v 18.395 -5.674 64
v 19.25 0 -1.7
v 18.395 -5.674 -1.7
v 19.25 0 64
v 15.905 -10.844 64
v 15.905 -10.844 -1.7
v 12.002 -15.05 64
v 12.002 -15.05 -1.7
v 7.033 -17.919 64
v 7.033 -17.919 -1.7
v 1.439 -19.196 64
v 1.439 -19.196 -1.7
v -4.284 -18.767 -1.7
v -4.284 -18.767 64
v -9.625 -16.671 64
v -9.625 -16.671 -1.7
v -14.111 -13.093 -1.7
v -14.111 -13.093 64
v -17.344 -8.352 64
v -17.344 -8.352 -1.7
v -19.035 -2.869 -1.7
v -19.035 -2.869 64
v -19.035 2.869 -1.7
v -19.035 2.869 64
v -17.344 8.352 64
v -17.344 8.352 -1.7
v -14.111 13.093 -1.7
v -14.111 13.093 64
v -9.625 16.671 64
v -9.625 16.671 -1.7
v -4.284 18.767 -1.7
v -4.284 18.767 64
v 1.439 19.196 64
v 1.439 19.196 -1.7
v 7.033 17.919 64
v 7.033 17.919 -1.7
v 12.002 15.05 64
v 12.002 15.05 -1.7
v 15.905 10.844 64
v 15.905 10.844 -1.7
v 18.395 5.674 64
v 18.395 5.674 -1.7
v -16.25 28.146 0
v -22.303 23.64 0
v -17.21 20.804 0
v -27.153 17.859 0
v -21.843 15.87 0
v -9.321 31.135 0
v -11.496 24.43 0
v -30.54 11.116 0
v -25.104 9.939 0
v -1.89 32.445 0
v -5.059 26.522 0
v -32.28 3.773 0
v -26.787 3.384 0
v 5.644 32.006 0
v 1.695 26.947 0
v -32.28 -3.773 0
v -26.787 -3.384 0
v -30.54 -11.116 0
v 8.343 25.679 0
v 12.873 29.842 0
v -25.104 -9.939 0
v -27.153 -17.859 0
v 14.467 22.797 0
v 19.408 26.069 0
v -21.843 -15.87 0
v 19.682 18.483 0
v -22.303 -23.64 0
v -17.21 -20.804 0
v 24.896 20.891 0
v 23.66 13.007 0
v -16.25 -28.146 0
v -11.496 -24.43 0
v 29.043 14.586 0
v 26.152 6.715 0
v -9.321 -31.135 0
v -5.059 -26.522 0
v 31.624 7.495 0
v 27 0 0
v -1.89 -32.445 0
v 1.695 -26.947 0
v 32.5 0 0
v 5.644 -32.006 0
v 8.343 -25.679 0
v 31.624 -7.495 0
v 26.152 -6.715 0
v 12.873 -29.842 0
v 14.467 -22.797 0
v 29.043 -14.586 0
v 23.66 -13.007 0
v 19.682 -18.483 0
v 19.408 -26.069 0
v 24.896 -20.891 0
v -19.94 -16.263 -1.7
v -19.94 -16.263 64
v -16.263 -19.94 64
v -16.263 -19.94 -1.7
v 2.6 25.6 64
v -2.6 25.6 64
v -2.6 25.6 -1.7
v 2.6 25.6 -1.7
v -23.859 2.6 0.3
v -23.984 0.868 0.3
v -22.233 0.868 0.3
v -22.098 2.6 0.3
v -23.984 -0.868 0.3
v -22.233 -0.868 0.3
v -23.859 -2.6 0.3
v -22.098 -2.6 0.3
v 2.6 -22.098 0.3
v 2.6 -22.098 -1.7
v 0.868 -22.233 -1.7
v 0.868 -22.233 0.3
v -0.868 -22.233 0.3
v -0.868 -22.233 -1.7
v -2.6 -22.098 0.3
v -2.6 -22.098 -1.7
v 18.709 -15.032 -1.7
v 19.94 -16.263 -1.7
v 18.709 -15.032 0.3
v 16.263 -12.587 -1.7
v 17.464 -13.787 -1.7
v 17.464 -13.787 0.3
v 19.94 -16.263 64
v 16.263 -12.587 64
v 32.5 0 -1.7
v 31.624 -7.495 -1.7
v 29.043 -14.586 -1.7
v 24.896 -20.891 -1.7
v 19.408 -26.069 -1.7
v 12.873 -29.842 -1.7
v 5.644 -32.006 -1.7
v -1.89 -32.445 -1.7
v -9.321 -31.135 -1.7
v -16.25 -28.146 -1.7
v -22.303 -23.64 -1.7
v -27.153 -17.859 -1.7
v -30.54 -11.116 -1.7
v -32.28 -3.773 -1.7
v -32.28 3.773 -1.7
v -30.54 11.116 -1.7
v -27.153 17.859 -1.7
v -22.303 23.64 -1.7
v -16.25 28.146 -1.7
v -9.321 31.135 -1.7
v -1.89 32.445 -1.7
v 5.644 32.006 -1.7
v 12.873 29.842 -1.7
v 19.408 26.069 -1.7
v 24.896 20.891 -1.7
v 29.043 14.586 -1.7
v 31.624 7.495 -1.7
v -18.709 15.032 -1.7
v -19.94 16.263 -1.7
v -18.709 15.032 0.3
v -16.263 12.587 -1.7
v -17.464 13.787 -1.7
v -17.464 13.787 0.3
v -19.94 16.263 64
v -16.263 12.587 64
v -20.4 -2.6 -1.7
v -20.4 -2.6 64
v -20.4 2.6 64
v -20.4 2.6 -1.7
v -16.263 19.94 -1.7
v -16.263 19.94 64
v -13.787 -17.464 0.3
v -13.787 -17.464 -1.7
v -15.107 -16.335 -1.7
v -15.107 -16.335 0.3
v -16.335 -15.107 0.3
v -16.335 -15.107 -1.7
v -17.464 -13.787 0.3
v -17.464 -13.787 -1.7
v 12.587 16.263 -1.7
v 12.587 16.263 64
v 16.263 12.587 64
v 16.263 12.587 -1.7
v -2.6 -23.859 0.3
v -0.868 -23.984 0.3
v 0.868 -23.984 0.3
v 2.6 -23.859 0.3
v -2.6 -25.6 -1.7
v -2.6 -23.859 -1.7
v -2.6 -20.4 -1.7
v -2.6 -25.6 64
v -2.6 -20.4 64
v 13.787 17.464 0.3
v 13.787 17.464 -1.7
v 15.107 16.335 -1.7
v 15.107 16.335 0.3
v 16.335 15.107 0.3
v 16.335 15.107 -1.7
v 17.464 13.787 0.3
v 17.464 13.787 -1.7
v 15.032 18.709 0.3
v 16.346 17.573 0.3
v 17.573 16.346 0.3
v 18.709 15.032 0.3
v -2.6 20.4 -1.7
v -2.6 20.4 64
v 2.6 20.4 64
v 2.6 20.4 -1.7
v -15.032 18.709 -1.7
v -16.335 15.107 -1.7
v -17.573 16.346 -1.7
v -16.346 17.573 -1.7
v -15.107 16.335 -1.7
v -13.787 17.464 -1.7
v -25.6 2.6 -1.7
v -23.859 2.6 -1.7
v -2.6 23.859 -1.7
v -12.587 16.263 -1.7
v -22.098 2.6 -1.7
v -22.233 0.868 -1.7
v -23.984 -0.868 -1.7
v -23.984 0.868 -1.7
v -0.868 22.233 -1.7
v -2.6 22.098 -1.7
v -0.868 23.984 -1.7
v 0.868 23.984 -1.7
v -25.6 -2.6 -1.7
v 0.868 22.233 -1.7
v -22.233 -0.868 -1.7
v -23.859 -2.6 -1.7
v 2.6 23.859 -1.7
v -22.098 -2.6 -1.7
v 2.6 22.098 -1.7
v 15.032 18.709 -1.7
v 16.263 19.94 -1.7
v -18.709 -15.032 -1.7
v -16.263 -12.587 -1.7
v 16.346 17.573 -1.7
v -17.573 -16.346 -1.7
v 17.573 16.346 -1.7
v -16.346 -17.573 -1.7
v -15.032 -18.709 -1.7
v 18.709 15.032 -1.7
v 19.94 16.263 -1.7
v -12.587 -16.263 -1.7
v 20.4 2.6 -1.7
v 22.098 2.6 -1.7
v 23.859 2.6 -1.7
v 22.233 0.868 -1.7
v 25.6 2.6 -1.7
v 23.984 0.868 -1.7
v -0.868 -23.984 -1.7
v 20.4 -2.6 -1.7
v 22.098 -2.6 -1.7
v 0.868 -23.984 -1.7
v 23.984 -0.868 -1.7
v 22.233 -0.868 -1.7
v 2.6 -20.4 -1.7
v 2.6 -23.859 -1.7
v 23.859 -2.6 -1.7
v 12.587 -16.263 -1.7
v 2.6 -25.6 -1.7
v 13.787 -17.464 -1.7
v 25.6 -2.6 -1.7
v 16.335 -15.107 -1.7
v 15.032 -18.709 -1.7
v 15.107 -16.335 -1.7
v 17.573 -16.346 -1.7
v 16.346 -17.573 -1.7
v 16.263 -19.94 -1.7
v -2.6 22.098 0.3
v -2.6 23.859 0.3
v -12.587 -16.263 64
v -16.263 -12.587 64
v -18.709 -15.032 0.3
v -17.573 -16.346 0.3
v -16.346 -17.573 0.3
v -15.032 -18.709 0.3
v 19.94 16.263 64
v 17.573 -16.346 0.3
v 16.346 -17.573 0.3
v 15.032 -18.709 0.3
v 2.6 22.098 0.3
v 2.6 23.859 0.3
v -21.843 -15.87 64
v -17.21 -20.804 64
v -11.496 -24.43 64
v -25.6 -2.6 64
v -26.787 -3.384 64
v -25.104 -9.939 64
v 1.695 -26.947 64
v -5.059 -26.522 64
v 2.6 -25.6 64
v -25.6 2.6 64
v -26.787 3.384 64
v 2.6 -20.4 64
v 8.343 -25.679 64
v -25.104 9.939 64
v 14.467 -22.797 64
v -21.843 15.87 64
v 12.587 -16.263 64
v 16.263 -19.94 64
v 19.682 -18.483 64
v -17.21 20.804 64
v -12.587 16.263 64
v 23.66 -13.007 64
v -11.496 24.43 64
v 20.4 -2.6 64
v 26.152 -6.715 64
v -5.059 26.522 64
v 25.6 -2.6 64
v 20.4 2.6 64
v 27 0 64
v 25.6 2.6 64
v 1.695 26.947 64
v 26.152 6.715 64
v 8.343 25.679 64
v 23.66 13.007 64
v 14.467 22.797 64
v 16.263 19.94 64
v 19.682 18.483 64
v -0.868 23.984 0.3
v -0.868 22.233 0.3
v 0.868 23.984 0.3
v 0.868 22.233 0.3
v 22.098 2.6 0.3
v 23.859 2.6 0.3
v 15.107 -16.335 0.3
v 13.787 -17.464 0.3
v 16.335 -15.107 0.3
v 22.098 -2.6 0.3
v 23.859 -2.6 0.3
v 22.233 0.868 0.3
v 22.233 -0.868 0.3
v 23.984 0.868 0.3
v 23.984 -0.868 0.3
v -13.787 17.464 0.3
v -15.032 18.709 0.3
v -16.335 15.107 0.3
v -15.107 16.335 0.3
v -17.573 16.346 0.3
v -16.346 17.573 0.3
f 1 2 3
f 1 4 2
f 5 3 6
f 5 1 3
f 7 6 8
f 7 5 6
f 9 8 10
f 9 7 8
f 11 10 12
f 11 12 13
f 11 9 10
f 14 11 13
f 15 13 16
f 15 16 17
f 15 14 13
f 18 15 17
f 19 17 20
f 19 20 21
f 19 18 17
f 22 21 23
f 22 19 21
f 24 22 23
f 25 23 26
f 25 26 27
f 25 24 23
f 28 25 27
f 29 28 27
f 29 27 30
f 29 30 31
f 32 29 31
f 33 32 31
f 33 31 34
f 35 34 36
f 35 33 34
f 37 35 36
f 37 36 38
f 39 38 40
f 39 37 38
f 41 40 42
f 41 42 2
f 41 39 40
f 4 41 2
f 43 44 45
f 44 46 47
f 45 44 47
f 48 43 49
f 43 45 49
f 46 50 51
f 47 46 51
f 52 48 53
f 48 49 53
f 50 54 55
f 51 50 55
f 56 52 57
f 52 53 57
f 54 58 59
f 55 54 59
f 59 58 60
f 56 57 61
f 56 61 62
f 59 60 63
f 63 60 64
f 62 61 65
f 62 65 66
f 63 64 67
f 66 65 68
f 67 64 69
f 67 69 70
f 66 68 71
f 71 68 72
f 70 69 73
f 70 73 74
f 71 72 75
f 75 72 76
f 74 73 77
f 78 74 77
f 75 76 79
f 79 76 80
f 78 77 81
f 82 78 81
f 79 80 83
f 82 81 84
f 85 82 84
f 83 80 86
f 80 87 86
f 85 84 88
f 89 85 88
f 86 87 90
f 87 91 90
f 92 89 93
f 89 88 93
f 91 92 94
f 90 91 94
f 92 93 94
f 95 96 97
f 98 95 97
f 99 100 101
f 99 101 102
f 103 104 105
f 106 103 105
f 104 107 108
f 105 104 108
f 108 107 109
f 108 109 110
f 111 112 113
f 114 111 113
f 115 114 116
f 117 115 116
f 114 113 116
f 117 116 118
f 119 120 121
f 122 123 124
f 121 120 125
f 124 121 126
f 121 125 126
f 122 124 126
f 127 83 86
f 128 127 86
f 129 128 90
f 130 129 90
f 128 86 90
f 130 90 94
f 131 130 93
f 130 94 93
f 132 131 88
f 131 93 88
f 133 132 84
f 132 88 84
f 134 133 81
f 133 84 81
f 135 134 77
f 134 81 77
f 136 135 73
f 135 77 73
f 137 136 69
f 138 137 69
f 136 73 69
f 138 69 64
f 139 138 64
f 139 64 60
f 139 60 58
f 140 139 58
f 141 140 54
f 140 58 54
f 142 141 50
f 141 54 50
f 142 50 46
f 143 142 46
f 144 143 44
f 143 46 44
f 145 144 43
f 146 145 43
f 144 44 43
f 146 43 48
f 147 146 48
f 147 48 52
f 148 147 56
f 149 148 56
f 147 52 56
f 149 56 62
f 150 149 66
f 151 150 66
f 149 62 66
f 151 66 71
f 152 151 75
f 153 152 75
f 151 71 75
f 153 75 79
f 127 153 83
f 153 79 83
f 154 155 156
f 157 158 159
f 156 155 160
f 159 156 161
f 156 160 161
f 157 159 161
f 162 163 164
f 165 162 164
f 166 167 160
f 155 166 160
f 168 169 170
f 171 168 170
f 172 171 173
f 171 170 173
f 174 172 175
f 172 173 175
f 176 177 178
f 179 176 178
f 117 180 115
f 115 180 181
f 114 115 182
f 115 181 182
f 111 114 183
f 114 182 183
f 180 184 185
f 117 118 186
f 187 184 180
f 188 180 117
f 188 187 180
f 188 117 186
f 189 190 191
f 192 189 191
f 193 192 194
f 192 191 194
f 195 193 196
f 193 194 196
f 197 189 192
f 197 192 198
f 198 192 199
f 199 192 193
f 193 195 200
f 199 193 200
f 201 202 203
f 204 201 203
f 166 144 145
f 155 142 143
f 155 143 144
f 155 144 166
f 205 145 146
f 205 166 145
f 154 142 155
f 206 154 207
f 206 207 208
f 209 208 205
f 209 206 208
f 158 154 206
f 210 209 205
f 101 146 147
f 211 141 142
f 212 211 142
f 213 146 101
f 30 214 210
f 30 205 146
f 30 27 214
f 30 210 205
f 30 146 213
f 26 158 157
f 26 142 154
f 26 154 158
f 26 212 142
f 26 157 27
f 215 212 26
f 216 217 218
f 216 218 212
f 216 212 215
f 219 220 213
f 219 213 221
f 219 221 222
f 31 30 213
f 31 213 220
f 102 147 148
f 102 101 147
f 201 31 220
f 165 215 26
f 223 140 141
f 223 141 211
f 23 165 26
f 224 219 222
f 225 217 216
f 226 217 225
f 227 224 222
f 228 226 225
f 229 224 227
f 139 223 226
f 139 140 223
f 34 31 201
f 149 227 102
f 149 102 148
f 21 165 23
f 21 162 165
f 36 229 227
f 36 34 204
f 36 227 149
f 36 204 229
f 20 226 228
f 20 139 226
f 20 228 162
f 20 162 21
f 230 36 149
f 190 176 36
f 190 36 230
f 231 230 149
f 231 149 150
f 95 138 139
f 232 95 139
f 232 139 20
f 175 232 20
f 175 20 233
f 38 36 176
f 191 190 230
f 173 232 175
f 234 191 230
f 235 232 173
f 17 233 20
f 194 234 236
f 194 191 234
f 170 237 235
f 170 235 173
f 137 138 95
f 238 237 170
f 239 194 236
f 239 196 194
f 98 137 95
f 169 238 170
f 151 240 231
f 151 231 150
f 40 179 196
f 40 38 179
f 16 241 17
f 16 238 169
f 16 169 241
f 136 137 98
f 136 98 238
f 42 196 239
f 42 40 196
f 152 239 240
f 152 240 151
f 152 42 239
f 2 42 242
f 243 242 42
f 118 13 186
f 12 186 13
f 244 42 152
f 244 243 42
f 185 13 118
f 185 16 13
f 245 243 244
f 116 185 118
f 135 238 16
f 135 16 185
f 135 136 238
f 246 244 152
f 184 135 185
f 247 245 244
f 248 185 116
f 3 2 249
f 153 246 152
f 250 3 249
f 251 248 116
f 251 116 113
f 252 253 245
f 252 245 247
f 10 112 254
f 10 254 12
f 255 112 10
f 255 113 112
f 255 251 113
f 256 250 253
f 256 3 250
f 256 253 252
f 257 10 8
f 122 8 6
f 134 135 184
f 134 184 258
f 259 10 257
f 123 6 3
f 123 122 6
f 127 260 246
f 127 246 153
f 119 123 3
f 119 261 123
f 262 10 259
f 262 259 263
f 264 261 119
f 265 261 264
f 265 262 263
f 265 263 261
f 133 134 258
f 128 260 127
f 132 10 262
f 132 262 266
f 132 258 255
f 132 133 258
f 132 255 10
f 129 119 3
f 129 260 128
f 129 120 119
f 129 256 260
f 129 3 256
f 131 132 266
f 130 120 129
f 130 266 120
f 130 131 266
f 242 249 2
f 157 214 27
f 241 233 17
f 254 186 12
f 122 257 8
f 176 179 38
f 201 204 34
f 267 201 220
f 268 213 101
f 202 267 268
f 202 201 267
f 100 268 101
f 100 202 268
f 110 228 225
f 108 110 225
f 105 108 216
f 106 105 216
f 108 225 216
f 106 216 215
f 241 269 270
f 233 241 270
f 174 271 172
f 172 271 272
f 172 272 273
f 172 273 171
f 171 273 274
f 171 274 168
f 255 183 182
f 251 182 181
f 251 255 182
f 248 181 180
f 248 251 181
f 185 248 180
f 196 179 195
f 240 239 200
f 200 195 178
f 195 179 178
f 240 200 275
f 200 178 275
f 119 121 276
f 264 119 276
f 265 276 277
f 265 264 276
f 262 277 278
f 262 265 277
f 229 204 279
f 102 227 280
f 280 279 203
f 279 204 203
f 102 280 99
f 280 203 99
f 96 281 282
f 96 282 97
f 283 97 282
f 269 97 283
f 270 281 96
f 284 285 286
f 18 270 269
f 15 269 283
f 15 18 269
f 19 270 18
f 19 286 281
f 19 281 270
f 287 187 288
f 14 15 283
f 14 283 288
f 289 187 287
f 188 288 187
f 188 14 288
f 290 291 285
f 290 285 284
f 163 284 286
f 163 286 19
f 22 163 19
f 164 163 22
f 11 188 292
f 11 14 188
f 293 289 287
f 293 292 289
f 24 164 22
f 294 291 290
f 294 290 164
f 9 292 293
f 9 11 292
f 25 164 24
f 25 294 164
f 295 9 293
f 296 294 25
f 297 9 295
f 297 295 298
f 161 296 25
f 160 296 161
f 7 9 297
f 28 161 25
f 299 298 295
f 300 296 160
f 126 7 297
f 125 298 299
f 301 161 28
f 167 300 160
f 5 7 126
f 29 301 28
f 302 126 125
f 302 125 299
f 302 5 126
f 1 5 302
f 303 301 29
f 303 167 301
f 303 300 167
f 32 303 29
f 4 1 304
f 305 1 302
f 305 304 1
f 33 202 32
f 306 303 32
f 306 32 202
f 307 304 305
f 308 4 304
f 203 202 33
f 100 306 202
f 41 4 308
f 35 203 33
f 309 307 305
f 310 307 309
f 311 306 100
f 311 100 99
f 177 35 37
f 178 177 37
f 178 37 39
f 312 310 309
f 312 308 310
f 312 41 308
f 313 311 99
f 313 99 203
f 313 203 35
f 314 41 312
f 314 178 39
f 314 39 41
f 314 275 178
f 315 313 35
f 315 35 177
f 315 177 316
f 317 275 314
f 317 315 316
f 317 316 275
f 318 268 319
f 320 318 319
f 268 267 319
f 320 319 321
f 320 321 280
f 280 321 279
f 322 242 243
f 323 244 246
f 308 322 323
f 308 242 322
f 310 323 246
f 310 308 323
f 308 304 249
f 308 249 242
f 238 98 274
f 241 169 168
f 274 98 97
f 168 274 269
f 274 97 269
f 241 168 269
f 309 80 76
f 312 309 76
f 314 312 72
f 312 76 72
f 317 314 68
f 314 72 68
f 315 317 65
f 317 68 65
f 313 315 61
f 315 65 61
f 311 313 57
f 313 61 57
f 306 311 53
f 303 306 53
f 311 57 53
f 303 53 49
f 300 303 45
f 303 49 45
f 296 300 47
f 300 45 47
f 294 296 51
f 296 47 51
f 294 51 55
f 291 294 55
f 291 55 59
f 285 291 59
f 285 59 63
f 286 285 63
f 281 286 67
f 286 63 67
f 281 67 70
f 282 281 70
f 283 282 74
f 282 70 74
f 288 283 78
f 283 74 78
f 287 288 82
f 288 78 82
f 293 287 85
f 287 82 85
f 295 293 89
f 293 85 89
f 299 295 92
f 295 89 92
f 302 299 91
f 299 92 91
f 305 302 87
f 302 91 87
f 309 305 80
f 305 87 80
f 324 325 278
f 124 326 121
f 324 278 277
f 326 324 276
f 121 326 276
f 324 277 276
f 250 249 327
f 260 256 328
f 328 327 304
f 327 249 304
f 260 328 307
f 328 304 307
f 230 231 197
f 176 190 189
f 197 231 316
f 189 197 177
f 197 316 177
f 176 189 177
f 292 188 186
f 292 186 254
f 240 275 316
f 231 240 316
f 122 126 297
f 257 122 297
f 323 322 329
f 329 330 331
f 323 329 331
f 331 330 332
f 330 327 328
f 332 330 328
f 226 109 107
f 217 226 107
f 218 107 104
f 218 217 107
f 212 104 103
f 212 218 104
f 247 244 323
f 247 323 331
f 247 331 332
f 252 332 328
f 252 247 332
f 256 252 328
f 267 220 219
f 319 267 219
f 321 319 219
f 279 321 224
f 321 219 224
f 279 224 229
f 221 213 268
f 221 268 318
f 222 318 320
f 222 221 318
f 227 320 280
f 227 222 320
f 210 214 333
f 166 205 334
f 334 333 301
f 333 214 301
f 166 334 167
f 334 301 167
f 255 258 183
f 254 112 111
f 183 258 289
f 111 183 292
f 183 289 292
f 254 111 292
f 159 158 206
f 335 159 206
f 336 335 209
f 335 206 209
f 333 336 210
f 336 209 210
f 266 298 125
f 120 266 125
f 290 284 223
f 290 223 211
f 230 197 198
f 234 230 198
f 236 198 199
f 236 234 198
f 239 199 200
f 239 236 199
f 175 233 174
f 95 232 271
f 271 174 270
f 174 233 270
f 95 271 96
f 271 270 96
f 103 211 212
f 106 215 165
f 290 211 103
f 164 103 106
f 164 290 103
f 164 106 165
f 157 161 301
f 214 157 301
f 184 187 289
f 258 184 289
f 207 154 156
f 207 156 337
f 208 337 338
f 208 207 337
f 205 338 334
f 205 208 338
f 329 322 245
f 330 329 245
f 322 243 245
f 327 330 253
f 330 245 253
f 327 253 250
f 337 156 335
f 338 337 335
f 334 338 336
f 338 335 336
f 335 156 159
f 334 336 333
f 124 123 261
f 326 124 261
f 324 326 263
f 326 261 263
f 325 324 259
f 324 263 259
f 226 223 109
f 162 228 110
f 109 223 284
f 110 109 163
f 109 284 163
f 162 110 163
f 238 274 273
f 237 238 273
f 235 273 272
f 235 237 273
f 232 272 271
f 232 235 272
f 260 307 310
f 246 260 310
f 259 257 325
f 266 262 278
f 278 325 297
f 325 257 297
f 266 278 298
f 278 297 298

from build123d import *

# Parameters (mm, degrees)
F0_R     = 27
F0_R_2   = 19.25
F1_DEPTH = 64
F2_R     = 32.5
F2_R_2   = 19.25
F3_DEPTH = 1.7
F4_W     = 5.2
F4_H     = 5.2
F5_DEPTH = 65.701
F6_R     = 24
F6_R_2   = 22.25
F7_DEPTH = 2


with BuildPart() as f1:
    # F0 (on Top) → F1 (new body)
    with BuildSketch(Plane.XY):
        Circle(F0_R)
        Circle(F0_R_2, mode=Mode.SUBTRACT)
    extrude(amount=F1_DEPTH)

    # F2 (on face) → F3 (join)
    with BuildSketch(Plane(origin=(0, 0, 0), x_dir=(1, 0, 0), z_dir=(0, 0, -1))):
        Circle(F2_R)
        Circle(F2_R_2, mode=Mode.SUBTRACT)
    extrude(amount=F3_DEPTH)

    # F4 (on face) → F5 (cut, through all)
    with BuildSketch(Plane.XY.offset(64)):
        with Locations((0, -23)):
            Rectangle(F4_W, F4_H)
        Polygon((16.263456, -12.586501), (12.586501, -16.263456), (16.263456, -19.940411), (19.940411, -16.263456), align=None)
        with Locations((23, 0)):
            Rectangle(F4_W, F4_H)
        Polygon((12.586501, 16.263456), (16.263456, 12.586501), (19.940411, 16.263456), (16.263456, 19.940411), align=None)
        with Locations((0, 23)):
            Rectangle(F4_W, F4_H)
        Polygon((-16.263456, 12.586501), (-12.586501, 16.263456), (-16.263456, 19.940411), (-19.940411, 16.263456), align=None)
        with Locations((-23, 0)):
            Rectangle(F4_W, F4_H)
        Polygon((-12.586501, -16.263456), (-16.263456, -12.586501), (-19.940411, -16.263456), (-16.263456, -19.940411), align=None)
    extrude(amount=-F5_DEPTH, mode=Mode.SUBTRACT)

    # F6 (on face) → F7 (join)
    with BuildSketch(Plane(origin=(0, 0, -1.7), x_dir=(1, 0, 0), z_dir=(0, 0, -1))):
        Circle(F6_R)
        Circle(F6_R_2, mode=Mode.SUBTRACT)
    extrude(amount=-F7_DEPTH)


solid = f1.part
